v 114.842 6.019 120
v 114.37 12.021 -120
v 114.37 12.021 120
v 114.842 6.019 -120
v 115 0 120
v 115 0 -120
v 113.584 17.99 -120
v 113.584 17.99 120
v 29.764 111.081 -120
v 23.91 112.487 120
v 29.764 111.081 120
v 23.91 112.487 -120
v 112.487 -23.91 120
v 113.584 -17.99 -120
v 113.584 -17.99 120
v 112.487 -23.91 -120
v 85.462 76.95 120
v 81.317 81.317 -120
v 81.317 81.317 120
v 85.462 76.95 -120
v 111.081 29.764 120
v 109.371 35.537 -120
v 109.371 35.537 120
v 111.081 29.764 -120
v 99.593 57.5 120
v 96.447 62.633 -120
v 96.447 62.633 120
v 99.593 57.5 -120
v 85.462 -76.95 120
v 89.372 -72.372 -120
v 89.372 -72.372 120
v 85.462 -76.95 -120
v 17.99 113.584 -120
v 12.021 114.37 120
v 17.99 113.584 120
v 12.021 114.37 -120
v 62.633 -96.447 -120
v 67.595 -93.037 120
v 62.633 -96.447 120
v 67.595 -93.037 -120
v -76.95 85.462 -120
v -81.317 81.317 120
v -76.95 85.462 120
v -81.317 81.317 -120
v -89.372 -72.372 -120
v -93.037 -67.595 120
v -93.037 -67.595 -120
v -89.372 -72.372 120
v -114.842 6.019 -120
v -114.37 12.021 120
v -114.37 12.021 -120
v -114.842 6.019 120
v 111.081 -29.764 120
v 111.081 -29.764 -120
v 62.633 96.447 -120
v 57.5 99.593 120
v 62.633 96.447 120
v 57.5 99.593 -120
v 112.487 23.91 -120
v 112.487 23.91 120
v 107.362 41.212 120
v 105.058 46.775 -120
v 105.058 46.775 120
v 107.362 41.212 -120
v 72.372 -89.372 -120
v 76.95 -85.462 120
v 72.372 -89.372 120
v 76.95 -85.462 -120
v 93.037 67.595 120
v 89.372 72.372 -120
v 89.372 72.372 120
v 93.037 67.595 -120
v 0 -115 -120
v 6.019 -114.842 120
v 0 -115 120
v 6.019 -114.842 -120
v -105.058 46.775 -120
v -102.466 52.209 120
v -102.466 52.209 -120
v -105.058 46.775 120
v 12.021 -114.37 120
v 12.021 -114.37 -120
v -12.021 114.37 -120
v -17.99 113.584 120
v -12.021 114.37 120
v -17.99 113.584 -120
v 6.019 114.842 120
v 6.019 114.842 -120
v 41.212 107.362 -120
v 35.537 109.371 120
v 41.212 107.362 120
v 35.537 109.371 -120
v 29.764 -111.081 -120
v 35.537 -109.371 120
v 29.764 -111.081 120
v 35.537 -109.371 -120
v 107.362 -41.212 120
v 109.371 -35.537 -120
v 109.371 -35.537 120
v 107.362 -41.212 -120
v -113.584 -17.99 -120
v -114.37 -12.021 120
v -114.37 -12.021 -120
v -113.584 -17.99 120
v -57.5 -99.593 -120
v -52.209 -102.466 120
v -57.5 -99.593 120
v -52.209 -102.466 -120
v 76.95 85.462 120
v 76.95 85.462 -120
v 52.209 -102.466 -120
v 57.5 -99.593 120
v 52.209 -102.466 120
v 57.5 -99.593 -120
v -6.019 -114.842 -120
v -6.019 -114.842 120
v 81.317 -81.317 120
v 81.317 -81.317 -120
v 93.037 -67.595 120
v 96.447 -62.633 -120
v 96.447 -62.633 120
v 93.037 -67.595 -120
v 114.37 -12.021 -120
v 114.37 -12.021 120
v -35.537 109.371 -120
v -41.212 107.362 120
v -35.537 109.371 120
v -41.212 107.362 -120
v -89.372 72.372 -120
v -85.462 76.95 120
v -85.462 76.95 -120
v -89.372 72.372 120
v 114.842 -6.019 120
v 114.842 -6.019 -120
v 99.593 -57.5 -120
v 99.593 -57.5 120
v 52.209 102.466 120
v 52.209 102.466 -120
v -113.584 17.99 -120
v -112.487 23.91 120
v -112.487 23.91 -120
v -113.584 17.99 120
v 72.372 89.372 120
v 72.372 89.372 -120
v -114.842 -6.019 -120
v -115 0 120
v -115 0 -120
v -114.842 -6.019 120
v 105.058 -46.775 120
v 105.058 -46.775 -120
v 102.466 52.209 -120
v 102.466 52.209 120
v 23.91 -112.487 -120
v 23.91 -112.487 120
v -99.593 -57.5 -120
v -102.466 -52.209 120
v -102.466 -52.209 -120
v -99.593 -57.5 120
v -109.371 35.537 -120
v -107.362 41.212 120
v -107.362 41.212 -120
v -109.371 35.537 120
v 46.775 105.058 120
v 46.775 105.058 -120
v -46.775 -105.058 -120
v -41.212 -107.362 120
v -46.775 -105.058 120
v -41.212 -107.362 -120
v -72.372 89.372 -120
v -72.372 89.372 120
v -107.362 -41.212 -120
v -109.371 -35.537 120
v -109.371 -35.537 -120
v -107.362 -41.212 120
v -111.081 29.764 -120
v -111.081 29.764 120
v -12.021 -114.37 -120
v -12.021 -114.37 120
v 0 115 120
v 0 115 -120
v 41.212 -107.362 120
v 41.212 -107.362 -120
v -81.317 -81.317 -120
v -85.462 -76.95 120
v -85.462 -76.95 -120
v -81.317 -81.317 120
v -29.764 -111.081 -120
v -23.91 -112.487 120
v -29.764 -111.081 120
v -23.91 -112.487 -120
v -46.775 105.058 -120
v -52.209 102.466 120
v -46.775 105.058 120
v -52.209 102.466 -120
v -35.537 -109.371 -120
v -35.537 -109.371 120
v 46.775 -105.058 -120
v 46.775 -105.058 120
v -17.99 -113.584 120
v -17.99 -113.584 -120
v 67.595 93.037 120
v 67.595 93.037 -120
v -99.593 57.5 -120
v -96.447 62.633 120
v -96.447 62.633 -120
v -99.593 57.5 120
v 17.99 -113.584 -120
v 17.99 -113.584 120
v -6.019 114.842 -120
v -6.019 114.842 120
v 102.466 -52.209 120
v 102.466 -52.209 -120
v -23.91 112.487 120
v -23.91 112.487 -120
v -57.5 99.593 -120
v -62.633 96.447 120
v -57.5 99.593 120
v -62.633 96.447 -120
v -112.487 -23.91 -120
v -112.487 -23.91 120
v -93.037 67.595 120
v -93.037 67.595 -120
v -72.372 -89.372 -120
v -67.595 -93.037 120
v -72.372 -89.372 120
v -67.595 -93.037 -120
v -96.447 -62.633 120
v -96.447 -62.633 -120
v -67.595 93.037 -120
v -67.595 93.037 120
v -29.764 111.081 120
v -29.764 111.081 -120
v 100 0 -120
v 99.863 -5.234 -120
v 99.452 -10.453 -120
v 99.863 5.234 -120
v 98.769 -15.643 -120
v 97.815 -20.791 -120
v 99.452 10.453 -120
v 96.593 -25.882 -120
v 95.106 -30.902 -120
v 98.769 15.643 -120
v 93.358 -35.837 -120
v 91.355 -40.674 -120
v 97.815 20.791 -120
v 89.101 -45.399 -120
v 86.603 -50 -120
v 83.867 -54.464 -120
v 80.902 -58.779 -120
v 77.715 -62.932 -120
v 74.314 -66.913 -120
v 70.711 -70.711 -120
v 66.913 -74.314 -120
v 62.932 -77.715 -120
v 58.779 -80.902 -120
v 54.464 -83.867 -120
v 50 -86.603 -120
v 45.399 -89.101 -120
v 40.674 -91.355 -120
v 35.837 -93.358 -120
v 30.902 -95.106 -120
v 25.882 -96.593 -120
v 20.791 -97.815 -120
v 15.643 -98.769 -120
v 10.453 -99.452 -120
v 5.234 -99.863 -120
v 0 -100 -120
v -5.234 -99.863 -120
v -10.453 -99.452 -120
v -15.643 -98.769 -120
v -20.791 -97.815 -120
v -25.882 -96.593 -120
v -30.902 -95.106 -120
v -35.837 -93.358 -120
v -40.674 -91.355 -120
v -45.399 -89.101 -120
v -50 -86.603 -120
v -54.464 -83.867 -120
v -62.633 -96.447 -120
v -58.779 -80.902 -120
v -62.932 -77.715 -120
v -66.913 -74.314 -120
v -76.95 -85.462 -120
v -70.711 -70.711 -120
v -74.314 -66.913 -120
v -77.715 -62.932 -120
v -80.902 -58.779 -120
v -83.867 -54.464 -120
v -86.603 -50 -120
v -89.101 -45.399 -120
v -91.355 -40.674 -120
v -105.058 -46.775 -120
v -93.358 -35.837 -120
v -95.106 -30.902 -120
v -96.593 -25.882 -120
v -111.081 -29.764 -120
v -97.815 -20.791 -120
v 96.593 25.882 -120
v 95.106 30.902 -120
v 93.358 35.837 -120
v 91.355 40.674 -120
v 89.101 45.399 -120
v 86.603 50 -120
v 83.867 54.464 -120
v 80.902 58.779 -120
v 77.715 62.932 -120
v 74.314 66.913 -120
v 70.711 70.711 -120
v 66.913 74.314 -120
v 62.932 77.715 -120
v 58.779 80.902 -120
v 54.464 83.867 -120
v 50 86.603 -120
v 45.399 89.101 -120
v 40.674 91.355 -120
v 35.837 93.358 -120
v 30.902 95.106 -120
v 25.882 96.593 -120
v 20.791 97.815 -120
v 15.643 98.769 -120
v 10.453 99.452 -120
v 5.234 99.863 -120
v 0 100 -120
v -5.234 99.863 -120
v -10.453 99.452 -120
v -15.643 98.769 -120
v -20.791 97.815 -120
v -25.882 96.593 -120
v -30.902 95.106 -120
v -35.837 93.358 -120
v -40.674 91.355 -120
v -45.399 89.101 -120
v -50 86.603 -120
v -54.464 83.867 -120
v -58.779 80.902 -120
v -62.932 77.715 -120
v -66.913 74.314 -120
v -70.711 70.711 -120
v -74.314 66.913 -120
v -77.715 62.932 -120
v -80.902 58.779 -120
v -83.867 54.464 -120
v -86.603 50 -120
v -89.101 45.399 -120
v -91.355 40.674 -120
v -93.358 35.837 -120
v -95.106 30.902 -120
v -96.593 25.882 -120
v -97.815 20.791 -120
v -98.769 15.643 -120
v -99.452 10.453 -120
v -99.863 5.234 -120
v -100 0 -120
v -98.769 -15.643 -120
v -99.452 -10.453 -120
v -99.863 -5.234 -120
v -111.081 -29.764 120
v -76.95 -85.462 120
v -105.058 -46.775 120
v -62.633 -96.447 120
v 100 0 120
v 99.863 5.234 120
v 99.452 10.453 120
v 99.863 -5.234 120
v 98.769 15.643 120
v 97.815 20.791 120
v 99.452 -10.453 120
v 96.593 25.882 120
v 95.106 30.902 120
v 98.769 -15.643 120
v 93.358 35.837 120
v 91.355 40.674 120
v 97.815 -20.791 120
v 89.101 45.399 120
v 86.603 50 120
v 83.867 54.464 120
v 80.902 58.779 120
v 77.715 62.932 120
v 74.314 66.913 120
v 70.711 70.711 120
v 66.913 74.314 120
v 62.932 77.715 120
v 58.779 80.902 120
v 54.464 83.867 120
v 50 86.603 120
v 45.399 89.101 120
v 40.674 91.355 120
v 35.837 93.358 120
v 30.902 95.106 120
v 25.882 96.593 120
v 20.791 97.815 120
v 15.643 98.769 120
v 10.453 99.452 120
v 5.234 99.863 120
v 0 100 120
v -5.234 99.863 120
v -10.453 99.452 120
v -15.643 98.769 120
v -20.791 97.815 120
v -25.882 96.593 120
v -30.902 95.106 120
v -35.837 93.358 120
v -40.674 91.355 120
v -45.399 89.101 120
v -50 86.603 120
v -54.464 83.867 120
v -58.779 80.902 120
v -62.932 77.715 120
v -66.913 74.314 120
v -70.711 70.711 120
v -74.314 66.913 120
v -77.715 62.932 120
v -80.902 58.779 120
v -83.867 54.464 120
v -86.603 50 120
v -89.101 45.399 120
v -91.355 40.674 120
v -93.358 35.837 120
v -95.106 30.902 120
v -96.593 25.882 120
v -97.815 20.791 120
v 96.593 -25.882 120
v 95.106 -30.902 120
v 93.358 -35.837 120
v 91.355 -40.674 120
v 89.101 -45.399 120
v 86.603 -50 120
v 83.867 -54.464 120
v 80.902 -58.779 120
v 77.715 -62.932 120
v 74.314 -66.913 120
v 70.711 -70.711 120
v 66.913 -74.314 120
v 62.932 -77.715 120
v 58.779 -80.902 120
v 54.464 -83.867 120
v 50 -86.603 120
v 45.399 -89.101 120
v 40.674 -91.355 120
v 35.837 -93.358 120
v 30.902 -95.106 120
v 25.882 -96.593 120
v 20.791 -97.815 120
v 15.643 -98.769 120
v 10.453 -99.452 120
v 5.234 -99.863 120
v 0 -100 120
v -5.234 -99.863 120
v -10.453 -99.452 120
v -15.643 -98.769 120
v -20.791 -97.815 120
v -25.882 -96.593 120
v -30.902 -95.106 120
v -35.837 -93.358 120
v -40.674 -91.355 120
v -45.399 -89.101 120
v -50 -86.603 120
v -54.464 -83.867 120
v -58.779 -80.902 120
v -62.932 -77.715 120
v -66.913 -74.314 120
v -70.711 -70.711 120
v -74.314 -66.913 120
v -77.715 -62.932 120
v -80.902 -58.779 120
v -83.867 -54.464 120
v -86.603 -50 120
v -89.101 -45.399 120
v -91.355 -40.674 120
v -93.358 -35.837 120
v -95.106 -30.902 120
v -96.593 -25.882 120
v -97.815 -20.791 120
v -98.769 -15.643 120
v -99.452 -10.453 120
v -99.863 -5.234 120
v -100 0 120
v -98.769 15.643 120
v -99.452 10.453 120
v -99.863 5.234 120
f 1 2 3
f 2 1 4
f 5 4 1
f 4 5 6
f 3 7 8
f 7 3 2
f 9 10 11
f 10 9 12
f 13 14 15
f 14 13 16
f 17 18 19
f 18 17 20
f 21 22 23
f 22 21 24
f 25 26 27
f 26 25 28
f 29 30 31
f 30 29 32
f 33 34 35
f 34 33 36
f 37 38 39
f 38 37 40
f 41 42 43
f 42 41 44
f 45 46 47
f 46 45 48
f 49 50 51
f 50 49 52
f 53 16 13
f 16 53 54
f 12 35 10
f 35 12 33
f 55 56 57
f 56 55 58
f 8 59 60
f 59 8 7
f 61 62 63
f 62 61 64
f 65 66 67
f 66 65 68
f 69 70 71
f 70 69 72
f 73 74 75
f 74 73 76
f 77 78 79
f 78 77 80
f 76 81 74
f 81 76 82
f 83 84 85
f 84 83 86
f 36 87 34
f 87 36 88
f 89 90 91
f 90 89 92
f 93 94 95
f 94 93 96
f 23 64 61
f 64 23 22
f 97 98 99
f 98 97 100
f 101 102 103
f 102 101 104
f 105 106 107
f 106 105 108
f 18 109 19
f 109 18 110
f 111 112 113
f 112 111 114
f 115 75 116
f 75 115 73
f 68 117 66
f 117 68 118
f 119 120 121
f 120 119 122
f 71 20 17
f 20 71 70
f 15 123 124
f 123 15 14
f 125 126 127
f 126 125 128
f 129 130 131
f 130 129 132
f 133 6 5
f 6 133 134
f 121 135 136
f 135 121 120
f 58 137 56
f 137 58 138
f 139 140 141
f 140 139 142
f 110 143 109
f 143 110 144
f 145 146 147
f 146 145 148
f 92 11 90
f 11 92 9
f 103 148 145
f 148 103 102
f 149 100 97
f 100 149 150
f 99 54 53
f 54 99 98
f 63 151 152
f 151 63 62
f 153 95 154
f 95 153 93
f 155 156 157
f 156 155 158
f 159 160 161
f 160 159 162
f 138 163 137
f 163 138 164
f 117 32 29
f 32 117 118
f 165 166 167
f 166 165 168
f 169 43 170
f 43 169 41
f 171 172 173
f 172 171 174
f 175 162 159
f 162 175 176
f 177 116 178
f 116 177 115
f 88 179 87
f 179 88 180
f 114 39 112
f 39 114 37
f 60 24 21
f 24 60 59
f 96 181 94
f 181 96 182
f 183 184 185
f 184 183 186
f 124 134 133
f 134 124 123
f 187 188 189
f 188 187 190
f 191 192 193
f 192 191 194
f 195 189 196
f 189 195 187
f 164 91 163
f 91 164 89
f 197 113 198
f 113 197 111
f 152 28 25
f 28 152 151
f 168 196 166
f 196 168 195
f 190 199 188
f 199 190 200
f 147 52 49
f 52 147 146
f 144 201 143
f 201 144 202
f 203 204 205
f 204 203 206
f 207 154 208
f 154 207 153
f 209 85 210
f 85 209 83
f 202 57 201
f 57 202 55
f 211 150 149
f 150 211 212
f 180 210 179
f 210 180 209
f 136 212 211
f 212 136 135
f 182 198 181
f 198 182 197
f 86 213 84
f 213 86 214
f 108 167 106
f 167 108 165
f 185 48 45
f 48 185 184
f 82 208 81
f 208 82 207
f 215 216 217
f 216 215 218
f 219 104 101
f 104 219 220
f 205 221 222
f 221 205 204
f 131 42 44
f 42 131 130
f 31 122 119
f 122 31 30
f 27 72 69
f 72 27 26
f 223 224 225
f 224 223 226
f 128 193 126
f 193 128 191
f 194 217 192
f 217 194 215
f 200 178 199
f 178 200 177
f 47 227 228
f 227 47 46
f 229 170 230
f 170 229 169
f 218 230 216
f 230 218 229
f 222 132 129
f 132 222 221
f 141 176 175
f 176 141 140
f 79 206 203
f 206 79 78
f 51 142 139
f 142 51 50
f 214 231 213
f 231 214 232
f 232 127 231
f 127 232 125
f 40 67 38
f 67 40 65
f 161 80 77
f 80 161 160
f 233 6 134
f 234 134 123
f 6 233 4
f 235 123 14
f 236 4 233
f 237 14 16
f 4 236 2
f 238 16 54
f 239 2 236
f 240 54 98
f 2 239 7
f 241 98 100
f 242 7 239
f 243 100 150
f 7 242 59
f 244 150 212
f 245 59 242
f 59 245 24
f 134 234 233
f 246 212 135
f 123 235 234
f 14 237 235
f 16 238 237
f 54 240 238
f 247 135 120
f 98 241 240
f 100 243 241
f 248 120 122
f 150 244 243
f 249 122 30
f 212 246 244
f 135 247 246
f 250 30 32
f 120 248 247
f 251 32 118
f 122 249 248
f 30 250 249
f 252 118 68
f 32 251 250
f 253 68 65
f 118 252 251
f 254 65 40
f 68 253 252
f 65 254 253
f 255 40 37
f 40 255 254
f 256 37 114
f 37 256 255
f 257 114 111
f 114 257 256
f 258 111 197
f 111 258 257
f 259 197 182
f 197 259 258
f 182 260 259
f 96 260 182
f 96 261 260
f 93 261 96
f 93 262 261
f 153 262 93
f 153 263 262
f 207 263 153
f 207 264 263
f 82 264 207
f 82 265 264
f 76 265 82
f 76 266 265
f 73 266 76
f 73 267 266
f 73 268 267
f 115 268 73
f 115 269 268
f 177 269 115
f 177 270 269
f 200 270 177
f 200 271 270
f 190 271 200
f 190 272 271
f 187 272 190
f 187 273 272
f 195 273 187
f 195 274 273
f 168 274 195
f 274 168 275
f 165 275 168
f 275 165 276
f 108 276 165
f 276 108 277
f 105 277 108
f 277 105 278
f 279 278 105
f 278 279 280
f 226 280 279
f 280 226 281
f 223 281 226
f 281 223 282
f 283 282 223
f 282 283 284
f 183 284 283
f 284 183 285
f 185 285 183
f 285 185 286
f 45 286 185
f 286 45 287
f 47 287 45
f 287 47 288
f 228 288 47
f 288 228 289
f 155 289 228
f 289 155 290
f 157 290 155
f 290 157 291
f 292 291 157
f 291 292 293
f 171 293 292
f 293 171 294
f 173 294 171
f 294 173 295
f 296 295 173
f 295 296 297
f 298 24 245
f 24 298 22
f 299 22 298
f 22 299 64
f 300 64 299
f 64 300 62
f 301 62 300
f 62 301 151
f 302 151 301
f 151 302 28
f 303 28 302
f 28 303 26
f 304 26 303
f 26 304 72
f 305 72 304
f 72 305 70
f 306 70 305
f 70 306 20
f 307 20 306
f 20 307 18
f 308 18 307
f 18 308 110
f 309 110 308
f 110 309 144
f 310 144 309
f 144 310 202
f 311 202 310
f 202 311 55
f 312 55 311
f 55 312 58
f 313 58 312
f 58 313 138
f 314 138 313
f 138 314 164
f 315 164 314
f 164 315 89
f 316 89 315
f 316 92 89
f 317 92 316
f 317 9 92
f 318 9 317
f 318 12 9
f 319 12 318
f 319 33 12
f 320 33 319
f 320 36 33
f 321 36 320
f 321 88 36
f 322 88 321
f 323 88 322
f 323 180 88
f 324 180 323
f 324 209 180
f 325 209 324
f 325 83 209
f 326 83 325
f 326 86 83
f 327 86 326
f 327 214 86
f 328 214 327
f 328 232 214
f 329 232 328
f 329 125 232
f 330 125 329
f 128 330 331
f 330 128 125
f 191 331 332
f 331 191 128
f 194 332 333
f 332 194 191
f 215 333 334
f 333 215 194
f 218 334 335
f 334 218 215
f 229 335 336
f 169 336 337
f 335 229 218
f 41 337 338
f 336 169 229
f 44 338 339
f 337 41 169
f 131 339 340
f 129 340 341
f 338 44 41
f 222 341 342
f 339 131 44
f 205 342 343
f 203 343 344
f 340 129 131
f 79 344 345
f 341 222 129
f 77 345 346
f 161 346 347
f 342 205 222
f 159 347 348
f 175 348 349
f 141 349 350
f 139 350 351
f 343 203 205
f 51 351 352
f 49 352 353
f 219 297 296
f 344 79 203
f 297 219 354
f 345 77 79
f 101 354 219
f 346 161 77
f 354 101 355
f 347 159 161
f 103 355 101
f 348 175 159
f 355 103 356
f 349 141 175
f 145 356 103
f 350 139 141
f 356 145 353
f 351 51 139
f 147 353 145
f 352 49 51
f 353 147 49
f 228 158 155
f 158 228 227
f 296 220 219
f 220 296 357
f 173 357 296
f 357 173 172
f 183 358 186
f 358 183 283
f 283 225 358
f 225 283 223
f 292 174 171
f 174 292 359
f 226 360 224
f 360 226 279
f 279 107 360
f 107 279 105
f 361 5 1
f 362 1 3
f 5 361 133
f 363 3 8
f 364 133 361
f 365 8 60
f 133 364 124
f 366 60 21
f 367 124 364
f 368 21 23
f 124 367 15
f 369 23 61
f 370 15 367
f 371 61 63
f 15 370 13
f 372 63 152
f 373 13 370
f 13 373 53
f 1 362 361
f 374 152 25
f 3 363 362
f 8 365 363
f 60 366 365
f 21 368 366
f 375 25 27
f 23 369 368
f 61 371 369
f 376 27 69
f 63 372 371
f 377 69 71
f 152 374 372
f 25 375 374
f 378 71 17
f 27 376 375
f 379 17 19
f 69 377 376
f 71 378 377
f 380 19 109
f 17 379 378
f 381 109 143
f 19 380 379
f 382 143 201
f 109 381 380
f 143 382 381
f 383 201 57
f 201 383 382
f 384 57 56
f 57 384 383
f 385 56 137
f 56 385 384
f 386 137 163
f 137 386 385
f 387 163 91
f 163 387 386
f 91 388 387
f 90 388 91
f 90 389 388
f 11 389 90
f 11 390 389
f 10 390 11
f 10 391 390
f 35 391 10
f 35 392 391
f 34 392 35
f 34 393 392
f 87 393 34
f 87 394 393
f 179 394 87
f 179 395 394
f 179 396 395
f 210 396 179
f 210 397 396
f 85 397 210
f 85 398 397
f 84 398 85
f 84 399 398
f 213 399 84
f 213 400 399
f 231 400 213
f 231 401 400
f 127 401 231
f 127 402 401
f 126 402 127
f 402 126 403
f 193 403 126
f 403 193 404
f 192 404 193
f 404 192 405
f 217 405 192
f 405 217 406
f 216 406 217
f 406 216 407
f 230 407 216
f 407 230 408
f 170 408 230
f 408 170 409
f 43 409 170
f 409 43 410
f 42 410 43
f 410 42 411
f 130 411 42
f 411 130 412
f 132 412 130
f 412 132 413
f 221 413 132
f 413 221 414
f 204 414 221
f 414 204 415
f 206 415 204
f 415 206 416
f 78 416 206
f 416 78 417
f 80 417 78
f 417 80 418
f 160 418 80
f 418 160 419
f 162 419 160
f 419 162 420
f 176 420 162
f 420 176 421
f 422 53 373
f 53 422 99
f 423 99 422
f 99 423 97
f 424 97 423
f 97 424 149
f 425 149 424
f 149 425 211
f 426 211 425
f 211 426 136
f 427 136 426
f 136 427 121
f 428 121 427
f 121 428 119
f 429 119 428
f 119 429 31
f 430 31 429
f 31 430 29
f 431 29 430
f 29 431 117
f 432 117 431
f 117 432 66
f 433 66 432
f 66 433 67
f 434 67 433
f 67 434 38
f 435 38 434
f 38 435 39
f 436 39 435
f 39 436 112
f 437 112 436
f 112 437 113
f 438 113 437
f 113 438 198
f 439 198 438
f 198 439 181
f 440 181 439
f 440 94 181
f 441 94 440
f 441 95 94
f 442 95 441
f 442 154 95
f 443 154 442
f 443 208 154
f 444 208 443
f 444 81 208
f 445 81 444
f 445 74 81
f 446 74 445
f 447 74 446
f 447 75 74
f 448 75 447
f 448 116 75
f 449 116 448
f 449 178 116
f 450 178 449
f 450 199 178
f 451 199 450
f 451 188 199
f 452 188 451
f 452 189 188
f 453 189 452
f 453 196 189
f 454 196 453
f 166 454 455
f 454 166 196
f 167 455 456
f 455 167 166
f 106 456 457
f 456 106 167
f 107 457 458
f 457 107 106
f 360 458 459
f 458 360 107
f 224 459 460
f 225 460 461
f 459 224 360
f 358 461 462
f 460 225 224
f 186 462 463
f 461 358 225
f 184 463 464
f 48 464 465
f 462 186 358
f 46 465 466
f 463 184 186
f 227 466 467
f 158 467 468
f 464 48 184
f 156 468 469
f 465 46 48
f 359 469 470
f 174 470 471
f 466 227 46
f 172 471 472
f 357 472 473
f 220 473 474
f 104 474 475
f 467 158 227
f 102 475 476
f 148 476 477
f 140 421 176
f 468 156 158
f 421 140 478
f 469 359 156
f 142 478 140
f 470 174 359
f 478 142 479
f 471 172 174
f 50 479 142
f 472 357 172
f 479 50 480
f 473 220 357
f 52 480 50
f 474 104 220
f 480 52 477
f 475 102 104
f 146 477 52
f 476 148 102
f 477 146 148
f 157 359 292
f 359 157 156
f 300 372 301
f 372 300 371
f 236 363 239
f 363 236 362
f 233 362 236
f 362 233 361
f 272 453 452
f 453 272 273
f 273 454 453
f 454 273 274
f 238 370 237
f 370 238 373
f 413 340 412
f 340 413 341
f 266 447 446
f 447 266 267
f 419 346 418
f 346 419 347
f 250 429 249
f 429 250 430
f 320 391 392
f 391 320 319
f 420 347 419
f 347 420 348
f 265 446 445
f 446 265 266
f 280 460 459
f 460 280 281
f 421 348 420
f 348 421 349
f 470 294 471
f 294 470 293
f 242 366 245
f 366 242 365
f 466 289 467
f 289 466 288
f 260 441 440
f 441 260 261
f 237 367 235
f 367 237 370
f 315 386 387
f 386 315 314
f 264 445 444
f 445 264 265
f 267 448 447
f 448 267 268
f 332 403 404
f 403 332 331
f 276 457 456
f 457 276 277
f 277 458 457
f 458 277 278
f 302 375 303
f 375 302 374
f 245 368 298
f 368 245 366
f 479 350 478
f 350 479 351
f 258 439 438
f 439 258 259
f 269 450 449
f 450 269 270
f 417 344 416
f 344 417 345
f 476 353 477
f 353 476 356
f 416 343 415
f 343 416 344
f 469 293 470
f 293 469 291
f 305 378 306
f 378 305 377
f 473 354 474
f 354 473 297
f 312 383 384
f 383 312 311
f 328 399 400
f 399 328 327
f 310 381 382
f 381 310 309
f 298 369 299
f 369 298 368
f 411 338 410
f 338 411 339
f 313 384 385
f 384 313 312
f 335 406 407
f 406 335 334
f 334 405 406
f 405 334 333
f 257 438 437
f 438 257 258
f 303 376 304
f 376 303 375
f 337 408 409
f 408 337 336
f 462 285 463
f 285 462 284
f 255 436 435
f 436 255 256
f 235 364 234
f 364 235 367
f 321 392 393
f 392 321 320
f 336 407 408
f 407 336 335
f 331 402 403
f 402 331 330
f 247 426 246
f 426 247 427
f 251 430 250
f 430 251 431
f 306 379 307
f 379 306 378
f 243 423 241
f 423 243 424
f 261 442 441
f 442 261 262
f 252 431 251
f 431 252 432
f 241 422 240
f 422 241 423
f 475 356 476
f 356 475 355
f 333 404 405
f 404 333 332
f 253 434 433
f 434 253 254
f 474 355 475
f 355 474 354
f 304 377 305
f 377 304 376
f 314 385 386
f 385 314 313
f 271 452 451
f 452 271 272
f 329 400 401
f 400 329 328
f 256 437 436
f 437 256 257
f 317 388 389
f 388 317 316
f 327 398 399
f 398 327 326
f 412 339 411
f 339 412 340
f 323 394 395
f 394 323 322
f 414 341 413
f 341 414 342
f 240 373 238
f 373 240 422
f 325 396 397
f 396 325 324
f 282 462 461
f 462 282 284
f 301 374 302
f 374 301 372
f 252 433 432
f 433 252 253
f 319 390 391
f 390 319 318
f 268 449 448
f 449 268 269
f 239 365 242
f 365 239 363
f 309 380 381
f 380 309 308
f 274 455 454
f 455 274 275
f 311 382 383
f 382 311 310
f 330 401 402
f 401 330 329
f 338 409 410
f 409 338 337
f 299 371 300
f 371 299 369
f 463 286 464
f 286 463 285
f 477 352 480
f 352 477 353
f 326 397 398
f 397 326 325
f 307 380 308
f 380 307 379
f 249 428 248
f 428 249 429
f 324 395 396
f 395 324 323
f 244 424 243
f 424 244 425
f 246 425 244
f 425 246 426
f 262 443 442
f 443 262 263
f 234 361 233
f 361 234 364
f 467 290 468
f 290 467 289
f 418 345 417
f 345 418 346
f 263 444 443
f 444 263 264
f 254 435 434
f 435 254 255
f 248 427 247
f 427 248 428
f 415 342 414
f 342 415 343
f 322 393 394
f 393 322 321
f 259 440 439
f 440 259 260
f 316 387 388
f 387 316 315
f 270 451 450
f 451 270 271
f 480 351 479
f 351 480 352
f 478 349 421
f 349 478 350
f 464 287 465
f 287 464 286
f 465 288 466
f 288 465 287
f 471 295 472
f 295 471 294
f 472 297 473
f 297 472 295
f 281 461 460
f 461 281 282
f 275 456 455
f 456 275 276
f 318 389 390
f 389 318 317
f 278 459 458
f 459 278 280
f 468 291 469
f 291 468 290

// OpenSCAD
echo(version=version());

$fn=120;

outerRadius = 115;
innerRadius = 100;

color([0.95, 0.95, 0.95, 0.1])
  translate([0, 0, -120])
    difference()
    {
      cylinder(r=outerRadius, h=240);
      cylinder(r=innerRadius, h=240);
    }
